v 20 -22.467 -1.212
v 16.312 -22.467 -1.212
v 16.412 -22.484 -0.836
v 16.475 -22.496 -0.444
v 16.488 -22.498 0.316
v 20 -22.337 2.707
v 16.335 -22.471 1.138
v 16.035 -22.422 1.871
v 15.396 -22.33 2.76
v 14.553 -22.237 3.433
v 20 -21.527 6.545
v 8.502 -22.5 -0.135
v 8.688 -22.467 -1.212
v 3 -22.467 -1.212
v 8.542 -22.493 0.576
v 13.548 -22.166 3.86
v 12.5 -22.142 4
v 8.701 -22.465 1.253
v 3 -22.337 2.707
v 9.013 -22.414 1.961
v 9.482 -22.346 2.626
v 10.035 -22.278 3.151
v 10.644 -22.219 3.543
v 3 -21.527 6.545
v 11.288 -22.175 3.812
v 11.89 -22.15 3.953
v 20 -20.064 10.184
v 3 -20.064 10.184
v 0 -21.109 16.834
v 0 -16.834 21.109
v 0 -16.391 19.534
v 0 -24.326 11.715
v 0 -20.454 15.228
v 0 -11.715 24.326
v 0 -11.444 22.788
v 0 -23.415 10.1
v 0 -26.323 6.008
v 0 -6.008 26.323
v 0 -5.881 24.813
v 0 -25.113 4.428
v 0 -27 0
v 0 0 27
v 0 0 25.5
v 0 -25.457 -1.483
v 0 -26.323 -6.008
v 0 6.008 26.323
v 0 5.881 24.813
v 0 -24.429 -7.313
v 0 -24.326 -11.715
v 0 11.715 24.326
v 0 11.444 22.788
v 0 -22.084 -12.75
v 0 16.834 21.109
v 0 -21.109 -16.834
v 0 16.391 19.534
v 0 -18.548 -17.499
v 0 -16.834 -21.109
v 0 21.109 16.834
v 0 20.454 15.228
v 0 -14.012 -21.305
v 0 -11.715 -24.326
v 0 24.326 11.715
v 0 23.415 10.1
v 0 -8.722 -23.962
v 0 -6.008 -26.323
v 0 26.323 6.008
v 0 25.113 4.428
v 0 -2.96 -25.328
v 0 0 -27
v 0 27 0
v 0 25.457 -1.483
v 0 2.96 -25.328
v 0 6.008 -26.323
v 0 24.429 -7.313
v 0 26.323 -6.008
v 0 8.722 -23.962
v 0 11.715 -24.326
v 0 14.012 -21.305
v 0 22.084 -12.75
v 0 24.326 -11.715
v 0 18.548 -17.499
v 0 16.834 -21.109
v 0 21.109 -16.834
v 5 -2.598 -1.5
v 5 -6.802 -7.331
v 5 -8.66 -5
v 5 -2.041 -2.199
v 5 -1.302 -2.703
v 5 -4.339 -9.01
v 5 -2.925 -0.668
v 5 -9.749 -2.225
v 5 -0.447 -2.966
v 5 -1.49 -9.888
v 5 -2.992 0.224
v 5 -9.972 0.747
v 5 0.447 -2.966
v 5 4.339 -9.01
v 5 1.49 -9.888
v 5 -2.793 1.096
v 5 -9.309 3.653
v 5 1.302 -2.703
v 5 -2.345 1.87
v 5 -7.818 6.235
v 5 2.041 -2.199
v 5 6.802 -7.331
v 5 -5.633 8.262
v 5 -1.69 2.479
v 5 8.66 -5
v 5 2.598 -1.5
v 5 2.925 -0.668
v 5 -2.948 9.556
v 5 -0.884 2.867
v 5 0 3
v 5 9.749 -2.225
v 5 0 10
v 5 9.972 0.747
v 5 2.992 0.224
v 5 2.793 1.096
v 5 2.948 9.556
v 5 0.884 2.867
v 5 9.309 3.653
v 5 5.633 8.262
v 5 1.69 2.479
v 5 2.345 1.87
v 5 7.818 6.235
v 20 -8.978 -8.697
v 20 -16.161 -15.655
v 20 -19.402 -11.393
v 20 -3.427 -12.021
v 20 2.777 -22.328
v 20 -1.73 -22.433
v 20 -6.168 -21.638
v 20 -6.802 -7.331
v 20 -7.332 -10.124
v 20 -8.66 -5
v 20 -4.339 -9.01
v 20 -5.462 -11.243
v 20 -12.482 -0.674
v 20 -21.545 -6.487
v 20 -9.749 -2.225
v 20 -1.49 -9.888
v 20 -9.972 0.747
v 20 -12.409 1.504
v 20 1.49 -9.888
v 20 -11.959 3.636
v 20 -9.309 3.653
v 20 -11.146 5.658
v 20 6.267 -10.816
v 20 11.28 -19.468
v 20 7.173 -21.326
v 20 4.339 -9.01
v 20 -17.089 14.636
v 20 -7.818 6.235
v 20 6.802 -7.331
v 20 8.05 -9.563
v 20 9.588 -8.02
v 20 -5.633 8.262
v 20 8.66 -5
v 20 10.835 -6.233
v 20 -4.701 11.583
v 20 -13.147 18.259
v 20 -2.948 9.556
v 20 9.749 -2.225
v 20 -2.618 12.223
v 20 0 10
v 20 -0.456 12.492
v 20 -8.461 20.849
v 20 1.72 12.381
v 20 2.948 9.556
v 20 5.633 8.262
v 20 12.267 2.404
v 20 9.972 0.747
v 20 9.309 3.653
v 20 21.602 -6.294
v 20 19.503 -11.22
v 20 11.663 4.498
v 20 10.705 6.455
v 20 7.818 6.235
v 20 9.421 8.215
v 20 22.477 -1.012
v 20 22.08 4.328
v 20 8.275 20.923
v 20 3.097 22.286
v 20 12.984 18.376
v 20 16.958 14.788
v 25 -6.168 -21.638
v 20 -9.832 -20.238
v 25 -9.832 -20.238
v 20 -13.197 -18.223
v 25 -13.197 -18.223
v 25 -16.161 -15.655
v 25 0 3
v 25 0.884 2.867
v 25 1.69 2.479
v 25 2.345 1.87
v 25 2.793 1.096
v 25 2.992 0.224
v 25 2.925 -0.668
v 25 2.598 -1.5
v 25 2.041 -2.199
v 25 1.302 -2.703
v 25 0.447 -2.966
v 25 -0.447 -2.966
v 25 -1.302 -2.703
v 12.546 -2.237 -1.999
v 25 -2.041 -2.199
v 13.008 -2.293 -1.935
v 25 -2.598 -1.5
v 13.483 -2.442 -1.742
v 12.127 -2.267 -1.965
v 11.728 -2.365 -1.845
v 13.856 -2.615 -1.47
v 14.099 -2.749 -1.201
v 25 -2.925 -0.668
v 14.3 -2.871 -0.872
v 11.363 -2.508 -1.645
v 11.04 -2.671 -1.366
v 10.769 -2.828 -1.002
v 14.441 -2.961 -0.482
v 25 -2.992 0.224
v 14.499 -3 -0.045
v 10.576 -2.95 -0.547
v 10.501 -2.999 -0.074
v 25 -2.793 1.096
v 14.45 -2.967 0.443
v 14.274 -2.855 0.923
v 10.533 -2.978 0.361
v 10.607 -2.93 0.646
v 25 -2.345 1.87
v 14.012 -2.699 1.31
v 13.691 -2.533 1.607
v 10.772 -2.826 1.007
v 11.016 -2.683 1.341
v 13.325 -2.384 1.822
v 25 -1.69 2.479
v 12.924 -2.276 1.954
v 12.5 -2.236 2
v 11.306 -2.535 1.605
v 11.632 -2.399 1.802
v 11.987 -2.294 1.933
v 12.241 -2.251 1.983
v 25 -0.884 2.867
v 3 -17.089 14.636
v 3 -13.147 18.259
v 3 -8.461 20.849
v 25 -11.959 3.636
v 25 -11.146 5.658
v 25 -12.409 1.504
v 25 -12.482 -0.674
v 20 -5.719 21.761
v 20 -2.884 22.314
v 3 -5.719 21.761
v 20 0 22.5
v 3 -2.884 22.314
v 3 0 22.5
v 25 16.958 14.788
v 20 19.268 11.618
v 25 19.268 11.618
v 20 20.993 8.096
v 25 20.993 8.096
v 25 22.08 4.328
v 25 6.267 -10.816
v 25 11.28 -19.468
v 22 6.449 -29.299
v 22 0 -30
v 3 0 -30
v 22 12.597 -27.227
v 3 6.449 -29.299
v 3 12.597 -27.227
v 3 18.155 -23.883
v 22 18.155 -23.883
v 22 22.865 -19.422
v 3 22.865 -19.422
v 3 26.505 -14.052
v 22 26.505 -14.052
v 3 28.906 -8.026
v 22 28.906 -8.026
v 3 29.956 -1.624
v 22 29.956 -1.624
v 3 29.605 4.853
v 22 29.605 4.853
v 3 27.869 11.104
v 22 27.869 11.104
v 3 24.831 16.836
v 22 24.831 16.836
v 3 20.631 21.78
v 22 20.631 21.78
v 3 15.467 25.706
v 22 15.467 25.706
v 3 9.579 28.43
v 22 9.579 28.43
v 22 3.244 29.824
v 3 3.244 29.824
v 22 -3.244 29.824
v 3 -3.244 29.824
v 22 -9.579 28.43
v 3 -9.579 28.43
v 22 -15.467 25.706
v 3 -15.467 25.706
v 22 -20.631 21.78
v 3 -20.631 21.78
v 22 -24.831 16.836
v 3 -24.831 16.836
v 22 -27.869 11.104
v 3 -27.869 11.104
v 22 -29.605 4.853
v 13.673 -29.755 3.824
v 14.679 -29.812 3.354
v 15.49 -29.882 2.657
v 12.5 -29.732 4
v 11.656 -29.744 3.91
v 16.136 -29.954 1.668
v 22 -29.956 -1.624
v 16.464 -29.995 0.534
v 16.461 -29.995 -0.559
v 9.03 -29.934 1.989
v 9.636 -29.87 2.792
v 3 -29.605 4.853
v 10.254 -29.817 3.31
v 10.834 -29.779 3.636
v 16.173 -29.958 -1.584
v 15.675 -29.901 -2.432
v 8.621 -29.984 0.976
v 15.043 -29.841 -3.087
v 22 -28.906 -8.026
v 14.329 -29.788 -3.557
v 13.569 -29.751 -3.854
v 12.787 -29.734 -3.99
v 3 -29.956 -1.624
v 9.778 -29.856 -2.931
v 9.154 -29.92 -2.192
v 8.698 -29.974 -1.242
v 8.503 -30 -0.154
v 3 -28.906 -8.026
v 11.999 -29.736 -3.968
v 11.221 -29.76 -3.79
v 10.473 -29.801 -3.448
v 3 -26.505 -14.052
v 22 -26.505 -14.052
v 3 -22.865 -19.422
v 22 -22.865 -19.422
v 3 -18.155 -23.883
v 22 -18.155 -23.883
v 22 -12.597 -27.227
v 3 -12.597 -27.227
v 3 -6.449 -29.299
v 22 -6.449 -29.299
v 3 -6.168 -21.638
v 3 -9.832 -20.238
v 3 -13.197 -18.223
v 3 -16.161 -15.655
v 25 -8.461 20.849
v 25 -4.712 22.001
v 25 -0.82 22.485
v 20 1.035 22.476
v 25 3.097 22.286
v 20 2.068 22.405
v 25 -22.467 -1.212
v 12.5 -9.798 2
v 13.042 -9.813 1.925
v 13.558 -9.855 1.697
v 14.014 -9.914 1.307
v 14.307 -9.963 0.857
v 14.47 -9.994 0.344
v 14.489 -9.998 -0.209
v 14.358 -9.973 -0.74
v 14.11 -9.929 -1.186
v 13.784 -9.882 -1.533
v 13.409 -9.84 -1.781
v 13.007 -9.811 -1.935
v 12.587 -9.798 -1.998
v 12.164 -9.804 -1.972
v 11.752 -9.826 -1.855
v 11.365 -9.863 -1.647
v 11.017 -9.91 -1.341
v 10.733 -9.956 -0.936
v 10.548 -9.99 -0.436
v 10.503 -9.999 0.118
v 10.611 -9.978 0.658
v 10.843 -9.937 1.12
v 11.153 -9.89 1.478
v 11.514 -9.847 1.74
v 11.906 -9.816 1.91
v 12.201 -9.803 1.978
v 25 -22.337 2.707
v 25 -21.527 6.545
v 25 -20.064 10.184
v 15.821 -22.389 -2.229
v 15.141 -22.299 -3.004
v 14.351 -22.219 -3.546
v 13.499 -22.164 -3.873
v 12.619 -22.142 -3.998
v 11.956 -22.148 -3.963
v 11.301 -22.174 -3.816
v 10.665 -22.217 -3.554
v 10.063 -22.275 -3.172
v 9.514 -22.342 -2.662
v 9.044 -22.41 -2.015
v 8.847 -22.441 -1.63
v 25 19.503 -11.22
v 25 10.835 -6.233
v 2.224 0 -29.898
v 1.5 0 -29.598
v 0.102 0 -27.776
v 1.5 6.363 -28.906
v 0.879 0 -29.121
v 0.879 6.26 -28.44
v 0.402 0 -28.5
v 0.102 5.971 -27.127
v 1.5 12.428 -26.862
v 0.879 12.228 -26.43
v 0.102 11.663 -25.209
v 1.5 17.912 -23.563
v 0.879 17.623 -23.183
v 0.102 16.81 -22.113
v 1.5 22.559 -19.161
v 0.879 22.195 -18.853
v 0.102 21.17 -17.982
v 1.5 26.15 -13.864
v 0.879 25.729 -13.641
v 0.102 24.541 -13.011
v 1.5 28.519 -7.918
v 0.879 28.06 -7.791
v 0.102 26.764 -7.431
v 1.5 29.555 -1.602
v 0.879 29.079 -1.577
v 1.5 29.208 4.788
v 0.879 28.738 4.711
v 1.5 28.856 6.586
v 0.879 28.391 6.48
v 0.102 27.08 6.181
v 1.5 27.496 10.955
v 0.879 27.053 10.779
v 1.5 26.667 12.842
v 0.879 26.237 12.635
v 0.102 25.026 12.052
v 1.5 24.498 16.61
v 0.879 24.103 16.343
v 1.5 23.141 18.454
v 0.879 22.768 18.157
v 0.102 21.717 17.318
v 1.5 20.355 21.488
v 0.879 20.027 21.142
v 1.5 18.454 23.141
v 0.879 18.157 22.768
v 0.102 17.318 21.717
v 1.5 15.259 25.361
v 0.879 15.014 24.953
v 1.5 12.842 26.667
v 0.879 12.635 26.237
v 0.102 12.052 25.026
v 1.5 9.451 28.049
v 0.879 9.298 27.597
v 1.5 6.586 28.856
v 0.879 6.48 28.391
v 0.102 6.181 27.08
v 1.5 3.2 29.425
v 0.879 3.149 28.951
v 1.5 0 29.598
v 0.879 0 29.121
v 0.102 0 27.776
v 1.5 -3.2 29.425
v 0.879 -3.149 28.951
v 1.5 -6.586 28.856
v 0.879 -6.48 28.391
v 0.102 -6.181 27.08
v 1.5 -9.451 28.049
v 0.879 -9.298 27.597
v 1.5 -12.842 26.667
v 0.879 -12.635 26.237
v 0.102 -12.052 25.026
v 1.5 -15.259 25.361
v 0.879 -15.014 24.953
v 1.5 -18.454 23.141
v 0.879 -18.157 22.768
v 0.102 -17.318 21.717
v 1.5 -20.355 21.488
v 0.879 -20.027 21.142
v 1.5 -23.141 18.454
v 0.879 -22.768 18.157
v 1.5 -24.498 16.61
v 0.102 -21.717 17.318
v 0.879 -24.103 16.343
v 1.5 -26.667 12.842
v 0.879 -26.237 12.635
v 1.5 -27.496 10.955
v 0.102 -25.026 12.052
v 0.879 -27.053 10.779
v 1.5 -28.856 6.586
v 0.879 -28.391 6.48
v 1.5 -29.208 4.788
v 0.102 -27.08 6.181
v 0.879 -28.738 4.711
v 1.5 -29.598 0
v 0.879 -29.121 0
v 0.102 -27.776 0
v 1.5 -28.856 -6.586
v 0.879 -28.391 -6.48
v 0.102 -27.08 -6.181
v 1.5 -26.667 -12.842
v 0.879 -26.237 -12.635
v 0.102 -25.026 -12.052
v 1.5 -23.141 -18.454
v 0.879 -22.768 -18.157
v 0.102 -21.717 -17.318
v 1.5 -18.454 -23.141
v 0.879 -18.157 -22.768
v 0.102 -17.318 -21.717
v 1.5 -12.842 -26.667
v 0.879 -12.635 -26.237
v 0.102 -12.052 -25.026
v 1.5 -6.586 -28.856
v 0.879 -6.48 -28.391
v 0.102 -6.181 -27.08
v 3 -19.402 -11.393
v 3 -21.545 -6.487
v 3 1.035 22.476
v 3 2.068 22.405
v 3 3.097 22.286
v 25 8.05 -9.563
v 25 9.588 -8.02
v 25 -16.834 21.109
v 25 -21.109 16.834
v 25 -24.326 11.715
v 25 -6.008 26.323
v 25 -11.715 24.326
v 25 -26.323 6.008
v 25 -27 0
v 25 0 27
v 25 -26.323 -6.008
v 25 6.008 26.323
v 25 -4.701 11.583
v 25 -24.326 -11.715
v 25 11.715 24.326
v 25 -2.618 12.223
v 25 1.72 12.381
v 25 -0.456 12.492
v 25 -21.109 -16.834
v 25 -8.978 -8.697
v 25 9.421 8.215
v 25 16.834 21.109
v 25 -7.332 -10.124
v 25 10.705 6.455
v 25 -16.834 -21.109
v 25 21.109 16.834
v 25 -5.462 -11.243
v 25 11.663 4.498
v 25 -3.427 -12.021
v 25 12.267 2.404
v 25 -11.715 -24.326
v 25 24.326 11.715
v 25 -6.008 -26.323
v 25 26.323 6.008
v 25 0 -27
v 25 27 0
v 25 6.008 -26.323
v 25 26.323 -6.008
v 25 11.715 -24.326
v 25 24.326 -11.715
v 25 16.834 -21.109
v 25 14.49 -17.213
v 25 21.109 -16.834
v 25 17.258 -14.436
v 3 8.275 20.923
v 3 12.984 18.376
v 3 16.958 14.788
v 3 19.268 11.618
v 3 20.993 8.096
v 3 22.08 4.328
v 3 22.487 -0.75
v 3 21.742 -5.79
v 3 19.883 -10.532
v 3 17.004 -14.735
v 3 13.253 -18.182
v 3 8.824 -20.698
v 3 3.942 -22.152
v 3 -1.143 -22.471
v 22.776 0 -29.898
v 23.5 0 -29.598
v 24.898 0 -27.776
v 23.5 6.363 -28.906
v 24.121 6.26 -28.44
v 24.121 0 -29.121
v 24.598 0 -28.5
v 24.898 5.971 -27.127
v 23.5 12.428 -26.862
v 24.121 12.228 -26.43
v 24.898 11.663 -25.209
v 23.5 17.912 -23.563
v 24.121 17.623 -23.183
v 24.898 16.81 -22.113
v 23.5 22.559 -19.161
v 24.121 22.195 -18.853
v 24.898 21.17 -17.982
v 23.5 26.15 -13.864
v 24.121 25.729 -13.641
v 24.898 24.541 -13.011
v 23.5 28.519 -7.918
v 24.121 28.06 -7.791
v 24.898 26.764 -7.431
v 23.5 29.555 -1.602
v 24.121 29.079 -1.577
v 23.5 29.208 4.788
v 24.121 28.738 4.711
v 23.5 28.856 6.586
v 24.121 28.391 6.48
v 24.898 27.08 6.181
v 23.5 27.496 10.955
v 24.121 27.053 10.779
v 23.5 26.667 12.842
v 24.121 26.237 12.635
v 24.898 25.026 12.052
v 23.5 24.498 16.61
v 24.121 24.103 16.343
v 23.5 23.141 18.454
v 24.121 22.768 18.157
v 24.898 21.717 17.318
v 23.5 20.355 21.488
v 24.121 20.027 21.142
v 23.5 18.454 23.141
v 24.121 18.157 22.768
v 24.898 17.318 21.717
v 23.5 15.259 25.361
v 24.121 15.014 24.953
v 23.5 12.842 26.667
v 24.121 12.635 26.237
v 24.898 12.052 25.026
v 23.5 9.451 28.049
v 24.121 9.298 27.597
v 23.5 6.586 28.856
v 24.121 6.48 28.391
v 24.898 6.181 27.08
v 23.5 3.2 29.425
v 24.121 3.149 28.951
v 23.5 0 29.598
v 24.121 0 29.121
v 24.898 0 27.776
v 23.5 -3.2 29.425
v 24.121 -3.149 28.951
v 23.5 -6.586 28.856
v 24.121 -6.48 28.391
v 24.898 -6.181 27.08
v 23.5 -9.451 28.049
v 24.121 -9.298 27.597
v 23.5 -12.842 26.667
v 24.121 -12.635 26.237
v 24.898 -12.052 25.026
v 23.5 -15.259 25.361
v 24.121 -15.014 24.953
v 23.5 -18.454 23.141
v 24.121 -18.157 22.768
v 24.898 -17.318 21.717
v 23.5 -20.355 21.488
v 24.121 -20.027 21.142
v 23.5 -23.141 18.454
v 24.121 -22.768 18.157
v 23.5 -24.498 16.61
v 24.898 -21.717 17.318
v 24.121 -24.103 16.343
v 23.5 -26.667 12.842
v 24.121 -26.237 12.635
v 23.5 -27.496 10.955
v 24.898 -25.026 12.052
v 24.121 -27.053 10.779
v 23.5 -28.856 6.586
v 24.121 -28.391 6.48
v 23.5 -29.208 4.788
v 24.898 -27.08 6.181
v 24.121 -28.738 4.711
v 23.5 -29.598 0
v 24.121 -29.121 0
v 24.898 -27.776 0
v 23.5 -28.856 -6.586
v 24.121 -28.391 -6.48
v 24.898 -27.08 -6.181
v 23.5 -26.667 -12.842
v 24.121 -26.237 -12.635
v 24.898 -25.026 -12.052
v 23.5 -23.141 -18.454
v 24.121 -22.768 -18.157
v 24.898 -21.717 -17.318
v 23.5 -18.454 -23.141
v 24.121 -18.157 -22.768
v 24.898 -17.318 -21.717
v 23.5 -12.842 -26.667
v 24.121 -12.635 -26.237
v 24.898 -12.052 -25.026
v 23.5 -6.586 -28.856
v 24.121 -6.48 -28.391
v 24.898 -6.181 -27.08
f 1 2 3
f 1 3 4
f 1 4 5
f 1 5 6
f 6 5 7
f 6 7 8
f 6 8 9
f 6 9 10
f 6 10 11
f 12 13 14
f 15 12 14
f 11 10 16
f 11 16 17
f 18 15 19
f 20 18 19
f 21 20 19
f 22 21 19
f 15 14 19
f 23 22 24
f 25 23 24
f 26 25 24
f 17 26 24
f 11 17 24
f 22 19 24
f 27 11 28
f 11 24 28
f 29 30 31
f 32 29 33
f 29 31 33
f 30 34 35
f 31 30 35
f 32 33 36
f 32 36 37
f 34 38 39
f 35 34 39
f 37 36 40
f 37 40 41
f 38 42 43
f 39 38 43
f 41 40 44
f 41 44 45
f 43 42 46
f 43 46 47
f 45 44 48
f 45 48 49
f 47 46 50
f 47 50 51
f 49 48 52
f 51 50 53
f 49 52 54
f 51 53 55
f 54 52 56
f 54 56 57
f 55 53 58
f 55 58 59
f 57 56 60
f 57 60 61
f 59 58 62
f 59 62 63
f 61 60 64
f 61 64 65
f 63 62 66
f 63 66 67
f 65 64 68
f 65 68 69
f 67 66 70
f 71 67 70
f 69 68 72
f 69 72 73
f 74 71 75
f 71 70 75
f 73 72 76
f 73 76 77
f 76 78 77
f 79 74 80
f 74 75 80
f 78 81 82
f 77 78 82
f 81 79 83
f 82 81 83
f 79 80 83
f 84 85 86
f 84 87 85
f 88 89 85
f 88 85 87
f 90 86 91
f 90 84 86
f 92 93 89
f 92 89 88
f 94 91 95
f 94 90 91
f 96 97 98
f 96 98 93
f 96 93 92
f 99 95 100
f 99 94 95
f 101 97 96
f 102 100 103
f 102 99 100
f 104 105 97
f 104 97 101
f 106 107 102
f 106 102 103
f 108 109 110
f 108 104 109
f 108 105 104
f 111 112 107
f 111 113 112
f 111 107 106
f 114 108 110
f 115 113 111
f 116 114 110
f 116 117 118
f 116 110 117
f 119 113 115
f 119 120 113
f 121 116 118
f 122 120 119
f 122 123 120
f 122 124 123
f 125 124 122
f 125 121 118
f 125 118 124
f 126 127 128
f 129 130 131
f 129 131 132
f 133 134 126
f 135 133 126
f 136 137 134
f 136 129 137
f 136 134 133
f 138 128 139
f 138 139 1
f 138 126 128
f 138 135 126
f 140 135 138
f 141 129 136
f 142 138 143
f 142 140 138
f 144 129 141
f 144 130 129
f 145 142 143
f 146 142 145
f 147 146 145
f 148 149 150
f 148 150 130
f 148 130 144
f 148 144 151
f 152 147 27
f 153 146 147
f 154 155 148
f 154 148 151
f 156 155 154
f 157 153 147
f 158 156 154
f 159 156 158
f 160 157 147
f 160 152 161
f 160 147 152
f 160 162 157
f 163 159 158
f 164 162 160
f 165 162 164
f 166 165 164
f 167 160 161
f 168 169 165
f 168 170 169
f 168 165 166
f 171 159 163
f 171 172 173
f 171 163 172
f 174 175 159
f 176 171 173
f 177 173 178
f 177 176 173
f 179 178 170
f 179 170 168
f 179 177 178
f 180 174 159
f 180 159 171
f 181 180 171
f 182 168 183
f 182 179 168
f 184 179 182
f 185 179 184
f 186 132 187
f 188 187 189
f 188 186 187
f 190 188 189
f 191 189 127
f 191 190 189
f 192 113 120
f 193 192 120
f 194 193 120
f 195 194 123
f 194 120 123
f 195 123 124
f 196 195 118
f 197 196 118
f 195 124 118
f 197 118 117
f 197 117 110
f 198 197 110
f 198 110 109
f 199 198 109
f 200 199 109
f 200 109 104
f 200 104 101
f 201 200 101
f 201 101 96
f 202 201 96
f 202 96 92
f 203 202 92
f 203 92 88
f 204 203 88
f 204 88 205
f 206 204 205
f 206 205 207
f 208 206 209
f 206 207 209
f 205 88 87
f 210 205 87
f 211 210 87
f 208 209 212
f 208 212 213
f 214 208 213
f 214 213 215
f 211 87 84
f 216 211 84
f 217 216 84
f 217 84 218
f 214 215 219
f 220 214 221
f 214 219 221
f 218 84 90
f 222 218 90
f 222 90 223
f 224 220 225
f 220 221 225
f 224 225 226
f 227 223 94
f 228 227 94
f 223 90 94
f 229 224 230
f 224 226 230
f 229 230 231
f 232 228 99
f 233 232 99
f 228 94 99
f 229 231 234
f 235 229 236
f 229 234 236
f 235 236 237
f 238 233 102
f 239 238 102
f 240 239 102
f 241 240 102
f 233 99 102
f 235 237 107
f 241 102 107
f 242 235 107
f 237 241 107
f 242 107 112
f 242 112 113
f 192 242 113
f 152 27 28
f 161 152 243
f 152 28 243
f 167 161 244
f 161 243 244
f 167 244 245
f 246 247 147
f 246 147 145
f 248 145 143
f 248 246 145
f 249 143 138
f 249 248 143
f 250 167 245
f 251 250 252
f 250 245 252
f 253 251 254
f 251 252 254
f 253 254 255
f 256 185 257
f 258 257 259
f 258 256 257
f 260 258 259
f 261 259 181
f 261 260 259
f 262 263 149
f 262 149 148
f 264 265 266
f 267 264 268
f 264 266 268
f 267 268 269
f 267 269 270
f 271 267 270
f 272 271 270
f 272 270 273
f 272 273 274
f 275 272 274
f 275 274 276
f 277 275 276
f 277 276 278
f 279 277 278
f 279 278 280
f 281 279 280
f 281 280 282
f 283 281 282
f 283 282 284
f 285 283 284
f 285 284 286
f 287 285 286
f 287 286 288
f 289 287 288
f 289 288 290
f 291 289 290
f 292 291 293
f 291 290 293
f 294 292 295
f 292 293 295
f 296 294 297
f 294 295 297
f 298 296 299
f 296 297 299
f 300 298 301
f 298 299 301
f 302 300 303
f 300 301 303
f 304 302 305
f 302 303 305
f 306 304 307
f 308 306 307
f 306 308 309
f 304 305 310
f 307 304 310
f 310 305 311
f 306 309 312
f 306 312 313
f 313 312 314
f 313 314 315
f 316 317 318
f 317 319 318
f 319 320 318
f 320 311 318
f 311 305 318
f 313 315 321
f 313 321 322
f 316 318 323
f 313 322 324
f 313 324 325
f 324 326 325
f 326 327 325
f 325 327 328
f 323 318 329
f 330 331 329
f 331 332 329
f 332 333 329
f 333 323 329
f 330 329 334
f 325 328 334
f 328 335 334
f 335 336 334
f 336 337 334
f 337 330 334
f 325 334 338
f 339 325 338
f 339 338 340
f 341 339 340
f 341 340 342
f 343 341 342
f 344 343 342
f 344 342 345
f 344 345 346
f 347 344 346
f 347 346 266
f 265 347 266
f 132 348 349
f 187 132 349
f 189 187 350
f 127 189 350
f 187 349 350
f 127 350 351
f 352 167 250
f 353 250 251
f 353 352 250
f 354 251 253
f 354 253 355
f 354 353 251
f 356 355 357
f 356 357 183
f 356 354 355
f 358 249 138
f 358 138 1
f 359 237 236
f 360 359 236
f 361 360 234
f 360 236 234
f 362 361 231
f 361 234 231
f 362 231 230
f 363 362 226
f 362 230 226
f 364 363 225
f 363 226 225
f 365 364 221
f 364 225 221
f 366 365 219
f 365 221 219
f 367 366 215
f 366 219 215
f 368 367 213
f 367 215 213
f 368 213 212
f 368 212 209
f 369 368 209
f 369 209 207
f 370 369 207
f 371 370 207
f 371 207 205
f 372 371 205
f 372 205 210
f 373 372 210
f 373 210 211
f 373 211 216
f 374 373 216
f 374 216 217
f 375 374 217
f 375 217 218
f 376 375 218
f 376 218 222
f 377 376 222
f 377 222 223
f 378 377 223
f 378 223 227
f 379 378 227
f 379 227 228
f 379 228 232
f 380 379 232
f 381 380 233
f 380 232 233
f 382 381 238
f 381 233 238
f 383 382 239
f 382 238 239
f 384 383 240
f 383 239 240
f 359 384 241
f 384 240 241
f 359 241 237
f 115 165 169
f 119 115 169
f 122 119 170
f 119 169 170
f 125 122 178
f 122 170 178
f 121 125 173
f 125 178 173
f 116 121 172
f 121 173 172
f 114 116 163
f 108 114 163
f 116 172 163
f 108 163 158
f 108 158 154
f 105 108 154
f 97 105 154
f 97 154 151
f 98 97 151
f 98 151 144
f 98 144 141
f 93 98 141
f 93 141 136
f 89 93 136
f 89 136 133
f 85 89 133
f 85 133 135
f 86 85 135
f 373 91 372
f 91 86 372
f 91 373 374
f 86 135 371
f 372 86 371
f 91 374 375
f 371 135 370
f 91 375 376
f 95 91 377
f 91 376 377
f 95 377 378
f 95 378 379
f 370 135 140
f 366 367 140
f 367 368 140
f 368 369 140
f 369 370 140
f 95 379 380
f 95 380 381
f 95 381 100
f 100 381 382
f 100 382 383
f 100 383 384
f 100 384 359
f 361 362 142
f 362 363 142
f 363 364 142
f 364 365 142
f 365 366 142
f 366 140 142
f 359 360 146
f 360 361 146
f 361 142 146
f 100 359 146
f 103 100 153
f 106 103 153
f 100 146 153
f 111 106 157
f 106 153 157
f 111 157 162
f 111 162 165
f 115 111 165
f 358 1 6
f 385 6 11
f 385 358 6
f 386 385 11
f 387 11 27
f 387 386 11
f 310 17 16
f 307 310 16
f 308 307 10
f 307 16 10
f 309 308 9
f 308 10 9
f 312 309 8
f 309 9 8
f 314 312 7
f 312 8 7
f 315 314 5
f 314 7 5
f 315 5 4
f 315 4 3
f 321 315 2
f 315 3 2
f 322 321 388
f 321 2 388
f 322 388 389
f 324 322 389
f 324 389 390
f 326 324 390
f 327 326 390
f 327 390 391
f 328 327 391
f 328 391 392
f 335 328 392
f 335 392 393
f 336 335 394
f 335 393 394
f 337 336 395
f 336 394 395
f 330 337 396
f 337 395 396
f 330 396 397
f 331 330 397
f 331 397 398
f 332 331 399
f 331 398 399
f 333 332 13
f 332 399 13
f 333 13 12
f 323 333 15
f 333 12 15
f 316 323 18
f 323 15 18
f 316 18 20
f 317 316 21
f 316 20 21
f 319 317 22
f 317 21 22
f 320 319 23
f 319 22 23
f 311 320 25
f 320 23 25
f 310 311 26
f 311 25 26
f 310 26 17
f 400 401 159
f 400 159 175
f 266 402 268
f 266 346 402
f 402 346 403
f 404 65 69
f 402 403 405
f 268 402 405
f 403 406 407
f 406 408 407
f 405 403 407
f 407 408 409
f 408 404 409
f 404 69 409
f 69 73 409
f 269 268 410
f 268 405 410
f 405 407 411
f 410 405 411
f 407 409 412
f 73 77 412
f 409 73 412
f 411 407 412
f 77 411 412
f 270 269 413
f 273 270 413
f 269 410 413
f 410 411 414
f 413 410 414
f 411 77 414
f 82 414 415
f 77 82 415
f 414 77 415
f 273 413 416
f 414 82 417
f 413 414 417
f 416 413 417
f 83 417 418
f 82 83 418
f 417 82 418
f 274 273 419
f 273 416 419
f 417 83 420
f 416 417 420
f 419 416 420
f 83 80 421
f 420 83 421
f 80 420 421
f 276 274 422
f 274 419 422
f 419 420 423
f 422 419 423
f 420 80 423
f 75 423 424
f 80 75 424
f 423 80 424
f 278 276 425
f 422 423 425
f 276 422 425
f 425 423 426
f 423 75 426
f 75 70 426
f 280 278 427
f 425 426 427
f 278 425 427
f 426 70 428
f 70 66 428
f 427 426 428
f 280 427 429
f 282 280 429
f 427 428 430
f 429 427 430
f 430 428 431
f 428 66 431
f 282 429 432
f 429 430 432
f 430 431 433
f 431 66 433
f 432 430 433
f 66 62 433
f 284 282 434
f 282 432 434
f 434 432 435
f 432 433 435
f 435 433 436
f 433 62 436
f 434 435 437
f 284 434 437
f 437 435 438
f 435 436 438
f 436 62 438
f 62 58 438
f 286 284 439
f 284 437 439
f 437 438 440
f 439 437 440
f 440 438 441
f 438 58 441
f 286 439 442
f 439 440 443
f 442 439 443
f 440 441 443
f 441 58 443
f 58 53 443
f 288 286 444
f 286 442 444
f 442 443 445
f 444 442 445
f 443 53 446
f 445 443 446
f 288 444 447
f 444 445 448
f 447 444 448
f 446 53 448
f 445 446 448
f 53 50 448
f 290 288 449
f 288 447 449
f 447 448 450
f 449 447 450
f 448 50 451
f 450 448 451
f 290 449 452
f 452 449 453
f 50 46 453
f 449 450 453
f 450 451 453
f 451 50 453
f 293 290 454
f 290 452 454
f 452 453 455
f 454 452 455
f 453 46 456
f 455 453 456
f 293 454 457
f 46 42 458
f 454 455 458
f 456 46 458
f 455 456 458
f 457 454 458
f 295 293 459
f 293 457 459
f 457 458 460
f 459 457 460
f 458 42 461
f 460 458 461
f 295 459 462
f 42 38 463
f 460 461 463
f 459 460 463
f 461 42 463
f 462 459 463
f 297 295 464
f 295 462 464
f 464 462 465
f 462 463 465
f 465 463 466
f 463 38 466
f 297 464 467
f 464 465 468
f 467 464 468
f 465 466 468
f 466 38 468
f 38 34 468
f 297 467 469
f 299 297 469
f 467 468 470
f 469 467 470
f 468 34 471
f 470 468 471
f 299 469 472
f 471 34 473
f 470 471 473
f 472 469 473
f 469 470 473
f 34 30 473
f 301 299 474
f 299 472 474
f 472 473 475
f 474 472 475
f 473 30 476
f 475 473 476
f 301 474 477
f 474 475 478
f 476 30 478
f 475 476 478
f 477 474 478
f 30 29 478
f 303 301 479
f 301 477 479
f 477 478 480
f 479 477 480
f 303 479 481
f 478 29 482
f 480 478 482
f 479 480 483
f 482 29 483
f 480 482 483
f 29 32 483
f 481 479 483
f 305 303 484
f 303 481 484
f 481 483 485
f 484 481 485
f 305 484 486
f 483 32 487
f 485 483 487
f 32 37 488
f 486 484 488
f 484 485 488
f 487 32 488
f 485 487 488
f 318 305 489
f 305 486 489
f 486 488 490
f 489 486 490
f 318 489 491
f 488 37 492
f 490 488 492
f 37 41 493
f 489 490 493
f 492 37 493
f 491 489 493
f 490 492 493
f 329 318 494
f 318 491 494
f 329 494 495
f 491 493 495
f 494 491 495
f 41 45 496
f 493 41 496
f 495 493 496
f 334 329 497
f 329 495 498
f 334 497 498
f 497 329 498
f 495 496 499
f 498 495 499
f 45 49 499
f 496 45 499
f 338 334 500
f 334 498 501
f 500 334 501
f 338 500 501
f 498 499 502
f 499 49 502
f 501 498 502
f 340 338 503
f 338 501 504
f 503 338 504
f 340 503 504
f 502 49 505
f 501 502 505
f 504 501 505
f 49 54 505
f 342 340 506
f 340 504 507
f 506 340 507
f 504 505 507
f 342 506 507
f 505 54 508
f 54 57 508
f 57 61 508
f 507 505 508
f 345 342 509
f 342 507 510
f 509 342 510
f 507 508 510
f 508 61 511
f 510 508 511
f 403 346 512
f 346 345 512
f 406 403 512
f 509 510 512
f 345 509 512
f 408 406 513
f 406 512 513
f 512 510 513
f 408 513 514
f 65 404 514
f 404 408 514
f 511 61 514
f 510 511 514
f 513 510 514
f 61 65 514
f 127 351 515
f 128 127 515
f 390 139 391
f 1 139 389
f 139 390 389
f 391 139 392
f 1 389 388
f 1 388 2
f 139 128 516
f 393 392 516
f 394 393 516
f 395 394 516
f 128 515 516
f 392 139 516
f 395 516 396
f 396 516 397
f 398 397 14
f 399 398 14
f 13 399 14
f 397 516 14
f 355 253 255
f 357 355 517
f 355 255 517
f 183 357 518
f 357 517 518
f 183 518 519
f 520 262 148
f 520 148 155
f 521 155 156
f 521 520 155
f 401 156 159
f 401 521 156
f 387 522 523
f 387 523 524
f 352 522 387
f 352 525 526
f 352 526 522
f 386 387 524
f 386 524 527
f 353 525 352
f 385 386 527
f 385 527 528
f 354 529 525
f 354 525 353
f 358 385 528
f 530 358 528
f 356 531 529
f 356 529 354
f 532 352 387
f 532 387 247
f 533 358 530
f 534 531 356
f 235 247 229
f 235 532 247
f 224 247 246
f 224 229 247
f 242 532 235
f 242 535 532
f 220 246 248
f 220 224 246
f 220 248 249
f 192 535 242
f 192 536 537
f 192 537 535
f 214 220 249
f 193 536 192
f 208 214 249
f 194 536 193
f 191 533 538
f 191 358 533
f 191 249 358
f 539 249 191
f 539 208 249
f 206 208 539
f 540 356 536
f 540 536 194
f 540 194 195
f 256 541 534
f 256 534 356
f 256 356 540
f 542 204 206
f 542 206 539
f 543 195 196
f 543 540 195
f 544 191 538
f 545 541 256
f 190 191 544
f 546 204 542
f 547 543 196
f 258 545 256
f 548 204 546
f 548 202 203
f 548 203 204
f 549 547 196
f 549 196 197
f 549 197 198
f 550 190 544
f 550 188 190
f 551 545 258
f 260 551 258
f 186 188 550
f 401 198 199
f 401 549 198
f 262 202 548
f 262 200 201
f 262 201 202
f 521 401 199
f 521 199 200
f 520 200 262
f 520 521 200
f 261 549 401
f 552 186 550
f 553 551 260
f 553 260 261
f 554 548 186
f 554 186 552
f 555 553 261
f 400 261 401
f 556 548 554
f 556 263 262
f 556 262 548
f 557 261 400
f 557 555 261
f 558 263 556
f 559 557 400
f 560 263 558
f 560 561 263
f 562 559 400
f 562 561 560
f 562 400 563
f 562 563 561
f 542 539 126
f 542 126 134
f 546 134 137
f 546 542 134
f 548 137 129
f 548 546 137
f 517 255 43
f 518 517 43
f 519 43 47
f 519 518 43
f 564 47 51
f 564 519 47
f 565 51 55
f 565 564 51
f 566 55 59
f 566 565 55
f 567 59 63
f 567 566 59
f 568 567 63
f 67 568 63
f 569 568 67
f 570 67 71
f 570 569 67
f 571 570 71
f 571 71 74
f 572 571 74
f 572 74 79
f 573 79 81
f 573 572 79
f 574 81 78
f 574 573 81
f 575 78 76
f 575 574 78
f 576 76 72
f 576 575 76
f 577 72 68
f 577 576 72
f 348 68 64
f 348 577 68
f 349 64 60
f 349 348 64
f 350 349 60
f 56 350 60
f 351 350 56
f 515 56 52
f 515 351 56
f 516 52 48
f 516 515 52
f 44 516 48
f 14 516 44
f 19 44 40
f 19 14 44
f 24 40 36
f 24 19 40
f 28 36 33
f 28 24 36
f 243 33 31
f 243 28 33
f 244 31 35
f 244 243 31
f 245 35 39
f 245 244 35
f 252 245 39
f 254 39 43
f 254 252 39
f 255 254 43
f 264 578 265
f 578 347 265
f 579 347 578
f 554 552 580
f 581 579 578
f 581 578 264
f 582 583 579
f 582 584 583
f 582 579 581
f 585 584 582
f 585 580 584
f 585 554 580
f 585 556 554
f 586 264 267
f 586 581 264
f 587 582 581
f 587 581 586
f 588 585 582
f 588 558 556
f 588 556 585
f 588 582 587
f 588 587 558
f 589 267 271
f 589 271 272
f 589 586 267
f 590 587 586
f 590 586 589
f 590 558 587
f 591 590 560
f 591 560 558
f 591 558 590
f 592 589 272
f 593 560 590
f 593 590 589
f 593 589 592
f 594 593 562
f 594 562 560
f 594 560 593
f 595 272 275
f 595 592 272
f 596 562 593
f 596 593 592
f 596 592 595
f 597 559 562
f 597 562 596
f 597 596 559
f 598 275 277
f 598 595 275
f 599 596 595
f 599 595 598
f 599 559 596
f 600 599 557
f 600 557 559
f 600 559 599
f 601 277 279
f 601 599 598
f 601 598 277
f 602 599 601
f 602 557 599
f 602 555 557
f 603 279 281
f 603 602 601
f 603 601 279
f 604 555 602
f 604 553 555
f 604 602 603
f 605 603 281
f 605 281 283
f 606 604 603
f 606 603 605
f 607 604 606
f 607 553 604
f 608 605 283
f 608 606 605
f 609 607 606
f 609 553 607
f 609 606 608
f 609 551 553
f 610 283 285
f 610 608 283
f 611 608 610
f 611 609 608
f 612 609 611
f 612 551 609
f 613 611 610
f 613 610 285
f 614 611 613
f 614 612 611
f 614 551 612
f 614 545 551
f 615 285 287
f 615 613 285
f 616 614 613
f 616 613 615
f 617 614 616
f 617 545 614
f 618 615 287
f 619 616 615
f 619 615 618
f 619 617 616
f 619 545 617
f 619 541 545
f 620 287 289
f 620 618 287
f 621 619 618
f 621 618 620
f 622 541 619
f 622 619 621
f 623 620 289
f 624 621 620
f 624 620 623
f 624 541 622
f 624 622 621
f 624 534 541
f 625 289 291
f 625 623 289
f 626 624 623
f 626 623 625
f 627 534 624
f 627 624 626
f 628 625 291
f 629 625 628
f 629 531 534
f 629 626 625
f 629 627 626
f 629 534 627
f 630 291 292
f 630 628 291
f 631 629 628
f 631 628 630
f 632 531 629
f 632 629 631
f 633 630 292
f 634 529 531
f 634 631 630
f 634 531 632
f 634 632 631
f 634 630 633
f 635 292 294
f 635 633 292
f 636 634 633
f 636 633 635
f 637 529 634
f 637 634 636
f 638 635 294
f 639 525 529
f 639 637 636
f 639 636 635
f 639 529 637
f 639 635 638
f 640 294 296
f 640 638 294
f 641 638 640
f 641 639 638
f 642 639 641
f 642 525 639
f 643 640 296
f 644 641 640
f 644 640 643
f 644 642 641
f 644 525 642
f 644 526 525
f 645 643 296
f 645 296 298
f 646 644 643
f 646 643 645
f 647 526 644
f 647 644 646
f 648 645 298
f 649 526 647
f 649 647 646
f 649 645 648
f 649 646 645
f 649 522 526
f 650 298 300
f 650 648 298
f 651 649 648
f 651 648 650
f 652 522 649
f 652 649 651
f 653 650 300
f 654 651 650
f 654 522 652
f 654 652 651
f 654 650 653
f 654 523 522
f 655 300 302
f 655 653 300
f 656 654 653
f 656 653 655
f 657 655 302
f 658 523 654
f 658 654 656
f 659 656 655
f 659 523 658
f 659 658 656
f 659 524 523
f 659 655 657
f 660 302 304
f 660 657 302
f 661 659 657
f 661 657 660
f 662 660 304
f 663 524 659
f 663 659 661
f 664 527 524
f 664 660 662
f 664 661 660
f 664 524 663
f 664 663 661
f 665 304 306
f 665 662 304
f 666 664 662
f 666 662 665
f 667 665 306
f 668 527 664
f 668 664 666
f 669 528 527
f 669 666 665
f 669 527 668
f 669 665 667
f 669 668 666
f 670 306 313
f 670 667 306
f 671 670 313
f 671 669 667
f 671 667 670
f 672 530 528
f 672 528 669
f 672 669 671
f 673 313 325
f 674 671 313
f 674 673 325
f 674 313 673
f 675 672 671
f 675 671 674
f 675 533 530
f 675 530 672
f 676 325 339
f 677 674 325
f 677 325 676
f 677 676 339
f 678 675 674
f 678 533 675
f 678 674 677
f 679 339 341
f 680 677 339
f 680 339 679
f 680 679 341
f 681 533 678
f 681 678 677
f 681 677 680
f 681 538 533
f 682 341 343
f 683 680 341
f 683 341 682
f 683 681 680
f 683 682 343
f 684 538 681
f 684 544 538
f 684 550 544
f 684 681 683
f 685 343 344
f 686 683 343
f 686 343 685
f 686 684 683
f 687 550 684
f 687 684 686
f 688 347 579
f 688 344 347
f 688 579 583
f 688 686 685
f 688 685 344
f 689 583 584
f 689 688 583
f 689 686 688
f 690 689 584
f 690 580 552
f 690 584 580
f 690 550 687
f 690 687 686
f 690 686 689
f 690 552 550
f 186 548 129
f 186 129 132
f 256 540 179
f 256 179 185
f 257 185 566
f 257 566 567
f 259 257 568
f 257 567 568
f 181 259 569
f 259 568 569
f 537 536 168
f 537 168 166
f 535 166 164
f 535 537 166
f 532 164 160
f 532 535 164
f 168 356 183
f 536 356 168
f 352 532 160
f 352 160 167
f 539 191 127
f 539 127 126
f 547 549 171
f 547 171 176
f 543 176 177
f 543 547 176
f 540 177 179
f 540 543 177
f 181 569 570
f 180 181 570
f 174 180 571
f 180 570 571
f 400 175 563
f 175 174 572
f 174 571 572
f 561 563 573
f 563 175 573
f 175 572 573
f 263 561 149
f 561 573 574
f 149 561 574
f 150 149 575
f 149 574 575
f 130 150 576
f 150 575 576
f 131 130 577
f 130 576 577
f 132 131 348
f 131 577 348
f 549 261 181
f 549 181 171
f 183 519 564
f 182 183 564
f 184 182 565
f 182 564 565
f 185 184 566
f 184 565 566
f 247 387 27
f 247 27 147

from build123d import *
from build123d.topology import SkipClean

# Parameters (mm, degrees)
SKETCH1_R           = 30
BOSS_EXTRUDE1_DEPTH = 25
FILLET1_R           = 3
SKETCH3_R           = 22.5
CUT_EXTRUDE1_DEPTH  = 20
CHAMFER1_SIZE       = 3
CUT_EXTRUDE2_DEPTH  = 50.244289131
CIRPATTERN1_COUNT   = 5
CIRPATTERN1_ANGLE   = 284
SKETCH4_R           = 10
BOSS_EXTRUDE2_DEPTH = 15
SKETCH5_R           = 3
CUT_EXTRUDE3_DEPTH  = 47.904157726
SKETCH6_R           = 2
CUT_EXTRUDE4_DEPTH  = 50.244289131
SKETCH7_R           = 4
CUT_EXTRUDE5_DEPTH  = 64.442887868


with BuildPart() as part:
    # Sketch1 → Boss-Extrude1 (new body)
    with BuildSketch(Plane(origin=(0, 0, 0), x_dir=(0, 0, -1), z_dir=(1, 0, 0))):
        Circle(SKETCH1_R)
    extrude(amount=BOSS_EXTRUDE1_DEPTH)

    # Fillet1
    fillet1_edges = [part.edges().sort_by_distance(p)[0] for p in [
        (0, 0, 30),
        (25, 0, 30),
    ]]
    fillet(fillet1_edges, radius=FILLET1_R)

    # Sketch3 → Cut-Extrude1 (cut)
    with BuildSketch(Plane.ZY):
        Circle(SKETCH3_R)
    extrude(amount=-CUT_EXTRUDE1_DEPTH, mode=Mode.SUBTRACT)

    # Chamfer1
    chamfer1_edges = [part.edges().sort_by_distance(p)[0] for p in [
        (0, 0, -22.5),
    ]]
    chamfer(chamfer1_edges, length=CHAMFER1_SIZE)

    # Sketch2 → Cut-Extrude2 (cut, through all)
    with BuildSketch(Plane.ZY.offset(-25)):
        with BuildLine():
            Line((-6.233158363, 10.835023619), (-11.219685054, 19.503042514))
            ThreePointArc((-11.219685054, 19.503042514), (-15.885142396, 15.934624283), (-19.468053536, 11.280287741))
            Line((-19.468053536, 11.280287741), (-10.815585298, 6.266826523))
            ThreePointArc((-10.815585298, 6.266826523), (-8.825079109, 8.852569046), (-6.233158363, 10.835023619))
        make_face()
    cut_extrude2 = extrude(amount=CUT_EXTRUDE2_DEPTH, mode=Mode.SUBTRACT)

    # CirPattern1: Cut-Extrude2 ×5 about axis
    with SkipClean():  # the faces are left unmerged after this step: merging them gives an invalid solid
        cirpattern1_axis = Axis((25, 0, 0), (1, 0, 0))
        for i in range(1, CIRPATTERN1_COUNT):
            add(cut_extrude2.rotate(cirpattern1_axis, i * CIRPATTERN1_ANGLE / (CIRPATTERN1_COUNT - 1)), mode=Mode.SUBTRACT)
    add(part.part.scale(1), mode=Mode.REPLACE)  # the faces are merged on a copy

    # Sketch4 → Boss-Extrude2 (add)
    with BuildSketch(Plane.ZY.offset(-20)):
        Circle(SKETCH4_R)
    extrude(amount=BOSS_EXTRUDE2_DEPTH)

    # Sketch5 → Cut-Extrude3 (cut, through all)
    with BuildSketch(Plane.ZY.offset(-5)):
        Circle(SKETCH5_R)
    extrude(amount=-CUT_EXTRUDE3_DEPTH, mode=Mode.SUBTRACT)

    # Sketch6 → Cut-Extrude4 (cut, through all)
    with BuildSketch(Plane(origin=(0, 0, 0), x_dir=(1, 0, 0), z_dir=(0, 1, 0))):
        with Locations((12.5, 0)):
            Circle(SKETCH6_R)
    extrude(amount=-CUT_EXTRUDE4_DEPTH, mode=Mode.SUBTRACT)

    # Sketch7 → Cut-Extrude5 (cut, through all)
    with BuildSketch(Plane(origin=(0, -20, 0), x_dir=(1, 0, 0), z_dir=(0, 1, 0))):
        with Locations((12.5, 0)):
            Circle(SKETCH7_R)
    extrude(amount=-CUT_EXTRUDE5_DEPTH, mode=Mode.SUBTRACT)


solid = part.part
